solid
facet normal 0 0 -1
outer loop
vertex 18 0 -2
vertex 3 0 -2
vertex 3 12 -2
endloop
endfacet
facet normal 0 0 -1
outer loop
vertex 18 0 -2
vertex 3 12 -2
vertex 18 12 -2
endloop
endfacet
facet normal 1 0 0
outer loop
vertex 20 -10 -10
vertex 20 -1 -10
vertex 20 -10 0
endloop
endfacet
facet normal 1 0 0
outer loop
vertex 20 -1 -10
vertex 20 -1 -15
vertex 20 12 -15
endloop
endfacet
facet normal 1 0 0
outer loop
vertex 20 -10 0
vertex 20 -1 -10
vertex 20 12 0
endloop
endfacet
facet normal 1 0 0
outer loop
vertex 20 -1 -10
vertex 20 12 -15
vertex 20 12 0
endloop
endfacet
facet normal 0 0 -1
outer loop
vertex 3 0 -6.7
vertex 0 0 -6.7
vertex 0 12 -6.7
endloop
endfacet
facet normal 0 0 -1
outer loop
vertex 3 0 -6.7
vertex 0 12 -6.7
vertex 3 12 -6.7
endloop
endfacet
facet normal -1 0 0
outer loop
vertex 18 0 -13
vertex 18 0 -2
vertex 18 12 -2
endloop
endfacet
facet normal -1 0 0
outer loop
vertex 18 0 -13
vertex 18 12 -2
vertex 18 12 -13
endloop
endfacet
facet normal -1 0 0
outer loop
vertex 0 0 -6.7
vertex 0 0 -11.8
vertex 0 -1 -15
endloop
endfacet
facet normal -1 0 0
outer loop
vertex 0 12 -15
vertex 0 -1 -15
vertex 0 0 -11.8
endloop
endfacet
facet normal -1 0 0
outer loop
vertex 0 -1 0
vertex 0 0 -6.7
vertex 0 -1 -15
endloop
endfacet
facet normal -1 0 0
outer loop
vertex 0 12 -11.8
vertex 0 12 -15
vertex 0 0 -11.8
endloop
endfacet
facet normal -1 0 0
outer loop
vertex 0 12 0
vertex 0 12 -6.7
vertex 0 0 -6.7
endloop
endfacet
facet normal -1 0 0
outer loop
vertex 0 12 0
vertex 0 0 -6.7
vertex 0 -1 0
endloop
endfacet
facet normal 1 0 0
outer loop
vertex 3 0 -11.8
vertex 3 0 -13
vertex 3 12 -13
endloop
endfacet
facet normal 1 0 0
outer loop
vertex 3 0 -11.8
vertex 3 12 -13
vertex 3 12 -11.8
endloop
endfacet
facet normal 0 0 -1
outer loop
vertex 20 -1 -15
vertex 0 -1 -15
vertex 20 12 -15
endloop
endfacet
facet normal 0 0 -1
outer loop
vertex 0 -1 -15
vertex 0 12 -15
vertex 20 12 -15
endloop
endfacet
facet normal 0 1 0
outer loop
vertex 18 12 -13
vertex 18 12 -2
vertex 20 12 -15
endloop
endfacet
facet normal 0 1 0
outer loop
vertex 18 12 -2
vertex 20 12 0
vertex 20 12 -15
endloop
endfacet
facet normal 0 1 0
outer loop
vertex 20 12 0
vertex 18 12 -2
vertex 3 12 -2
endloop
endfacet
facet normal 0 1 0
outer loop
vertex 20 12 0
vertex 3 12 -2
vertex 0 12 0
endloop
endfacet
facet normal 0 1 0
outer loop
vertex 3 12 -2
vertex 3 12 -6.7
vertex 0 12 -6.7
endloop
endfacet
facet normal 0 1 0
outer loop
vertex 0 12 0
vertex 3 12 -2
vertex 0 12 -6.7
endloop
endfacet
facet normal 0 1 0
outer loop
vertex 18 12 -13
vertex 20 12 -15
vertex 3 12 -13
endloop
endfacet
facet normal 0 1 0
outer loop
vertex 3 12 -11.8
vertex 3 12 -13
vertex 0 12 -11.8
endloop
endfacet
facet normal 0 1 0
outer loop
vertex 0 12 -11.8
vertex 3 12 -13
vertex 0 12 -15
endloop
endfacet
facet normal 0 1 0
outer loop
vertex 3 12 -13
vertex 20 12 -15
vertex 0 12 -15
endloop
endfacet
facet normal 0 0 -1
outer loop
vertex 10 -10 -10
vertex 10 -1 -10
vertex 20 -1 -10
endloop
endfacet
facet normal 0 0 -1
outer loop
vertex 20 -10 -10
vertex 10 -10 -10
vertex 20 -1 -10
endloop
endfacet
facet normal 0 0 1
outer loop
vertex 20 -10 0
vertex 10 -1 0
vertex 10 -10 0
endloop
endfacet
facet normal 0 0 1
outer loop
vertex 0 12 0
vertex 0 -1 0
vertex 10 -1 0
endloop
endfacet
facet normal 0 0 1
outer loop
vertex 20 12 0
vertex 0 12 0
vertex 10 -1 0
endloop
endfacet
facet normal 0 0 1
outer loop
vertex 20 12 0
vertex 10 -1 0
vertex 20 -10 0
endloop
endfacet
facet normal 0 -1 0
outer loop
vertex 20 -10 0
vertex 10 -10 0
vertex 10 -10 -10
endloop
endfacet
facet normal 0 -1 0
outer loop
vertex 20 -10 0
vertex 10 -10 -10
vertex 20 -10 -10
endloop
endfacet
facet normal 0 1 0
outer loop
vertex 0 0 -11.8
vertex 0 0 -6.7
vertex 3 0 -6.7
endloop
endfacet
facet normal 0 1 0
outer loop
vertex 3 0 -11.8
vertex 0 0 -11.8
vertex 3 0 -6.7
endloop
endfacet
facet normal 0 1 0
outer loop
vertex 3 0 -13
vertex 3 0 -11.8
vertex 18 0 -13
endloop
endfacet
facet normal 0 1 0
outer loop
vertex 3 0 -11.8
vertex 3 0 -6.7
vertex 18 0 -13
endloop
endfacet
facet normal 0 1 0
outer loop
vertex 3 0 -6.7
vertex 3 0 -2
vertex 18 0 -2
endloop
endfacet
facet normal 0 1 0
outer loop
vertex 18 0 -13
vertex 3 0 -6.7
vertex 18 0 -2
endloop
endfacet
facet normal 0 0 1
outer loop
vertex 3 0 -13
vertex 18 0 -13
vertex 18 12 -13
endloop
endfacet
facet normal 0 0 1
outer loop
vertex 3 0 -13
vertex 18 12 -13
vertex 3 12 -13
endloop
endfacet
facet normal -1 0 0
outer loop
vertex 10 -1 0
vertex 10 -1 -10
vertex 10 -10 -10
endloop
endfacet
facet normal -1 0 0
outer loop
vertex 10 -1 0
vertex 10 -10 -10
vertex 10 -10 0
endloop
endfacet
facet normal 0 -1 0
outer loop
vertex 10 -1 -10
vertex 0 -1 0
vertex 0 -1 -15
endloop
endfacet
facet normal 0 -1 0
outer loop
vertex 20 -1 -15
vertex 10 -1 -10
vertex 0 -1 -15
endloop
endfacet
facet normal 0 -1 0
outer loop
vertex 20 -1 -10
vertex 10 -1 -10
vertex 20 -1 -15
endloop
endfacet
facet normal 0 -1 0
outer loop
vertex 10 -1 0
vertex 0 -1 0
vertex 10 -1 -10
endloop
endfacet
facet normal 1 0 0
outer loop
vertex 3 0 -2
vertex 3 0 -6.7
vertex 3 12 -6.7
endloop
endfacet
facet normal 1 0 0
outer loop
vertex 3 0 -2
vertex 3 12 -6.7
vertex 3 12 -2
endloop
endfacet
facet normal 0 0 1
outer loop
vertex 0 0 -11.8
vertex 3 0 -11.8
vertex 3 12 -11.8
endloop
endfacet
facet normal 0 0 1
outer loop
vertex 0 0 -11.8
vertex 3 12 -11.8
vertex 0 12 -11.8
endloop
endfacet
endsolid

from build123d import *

# Parameters (mm, degrees)
BOSS_EXTRUDE1_DEPTH = 12
SKETCH3_W           = 20
SKETCH3_H           = 15
BOSS_EXTRUDE2_DEPTH = 1
SKETCH4_W           = 10
SKETCH4_H           = 10
BOSS_EXTRUDE3_DEPTH = 9


with BuildPart() as part:
    # Sketch1 → Boss-Extrude1 (new body)
    with BuildSketch(Plane(origin=(0, 0, 0), x_dir=(1, 0, 0), z_dir=(0, 1, 0))):
        Polygon((3, 2), (18, 2), (18, 13), (3, 13), (3, 11.8), (0, 11.8), (0, 15), (20, 15), (20, 0), (0, 0), (0, 6.7), (3, 6.7), align=None)
    extrude(amount=BOSS_EXTRUDE1_DEPTH)

    # Sketch3 → Boss-Extrude2 (add)
    with BuildSketch(Plane.XZ):
        with Locations((10, -7.5)):
            Rectangle(SKETCH3_W, SKETCH3_H)
    extrude(amount=BOSS_EXTRUDE2_DEPTH)

    # Sketch4 → Boss-Extrude3 (add)
    with BuildSketch(Plane.XZ.offset(1)):
        with Locations((15, -5)):
            Rectangle(SKETCH4_W, SKETCH4_H)
    extrude(amount=BOSS_EXTRUDE3_DEPTH)


solid = part.part
